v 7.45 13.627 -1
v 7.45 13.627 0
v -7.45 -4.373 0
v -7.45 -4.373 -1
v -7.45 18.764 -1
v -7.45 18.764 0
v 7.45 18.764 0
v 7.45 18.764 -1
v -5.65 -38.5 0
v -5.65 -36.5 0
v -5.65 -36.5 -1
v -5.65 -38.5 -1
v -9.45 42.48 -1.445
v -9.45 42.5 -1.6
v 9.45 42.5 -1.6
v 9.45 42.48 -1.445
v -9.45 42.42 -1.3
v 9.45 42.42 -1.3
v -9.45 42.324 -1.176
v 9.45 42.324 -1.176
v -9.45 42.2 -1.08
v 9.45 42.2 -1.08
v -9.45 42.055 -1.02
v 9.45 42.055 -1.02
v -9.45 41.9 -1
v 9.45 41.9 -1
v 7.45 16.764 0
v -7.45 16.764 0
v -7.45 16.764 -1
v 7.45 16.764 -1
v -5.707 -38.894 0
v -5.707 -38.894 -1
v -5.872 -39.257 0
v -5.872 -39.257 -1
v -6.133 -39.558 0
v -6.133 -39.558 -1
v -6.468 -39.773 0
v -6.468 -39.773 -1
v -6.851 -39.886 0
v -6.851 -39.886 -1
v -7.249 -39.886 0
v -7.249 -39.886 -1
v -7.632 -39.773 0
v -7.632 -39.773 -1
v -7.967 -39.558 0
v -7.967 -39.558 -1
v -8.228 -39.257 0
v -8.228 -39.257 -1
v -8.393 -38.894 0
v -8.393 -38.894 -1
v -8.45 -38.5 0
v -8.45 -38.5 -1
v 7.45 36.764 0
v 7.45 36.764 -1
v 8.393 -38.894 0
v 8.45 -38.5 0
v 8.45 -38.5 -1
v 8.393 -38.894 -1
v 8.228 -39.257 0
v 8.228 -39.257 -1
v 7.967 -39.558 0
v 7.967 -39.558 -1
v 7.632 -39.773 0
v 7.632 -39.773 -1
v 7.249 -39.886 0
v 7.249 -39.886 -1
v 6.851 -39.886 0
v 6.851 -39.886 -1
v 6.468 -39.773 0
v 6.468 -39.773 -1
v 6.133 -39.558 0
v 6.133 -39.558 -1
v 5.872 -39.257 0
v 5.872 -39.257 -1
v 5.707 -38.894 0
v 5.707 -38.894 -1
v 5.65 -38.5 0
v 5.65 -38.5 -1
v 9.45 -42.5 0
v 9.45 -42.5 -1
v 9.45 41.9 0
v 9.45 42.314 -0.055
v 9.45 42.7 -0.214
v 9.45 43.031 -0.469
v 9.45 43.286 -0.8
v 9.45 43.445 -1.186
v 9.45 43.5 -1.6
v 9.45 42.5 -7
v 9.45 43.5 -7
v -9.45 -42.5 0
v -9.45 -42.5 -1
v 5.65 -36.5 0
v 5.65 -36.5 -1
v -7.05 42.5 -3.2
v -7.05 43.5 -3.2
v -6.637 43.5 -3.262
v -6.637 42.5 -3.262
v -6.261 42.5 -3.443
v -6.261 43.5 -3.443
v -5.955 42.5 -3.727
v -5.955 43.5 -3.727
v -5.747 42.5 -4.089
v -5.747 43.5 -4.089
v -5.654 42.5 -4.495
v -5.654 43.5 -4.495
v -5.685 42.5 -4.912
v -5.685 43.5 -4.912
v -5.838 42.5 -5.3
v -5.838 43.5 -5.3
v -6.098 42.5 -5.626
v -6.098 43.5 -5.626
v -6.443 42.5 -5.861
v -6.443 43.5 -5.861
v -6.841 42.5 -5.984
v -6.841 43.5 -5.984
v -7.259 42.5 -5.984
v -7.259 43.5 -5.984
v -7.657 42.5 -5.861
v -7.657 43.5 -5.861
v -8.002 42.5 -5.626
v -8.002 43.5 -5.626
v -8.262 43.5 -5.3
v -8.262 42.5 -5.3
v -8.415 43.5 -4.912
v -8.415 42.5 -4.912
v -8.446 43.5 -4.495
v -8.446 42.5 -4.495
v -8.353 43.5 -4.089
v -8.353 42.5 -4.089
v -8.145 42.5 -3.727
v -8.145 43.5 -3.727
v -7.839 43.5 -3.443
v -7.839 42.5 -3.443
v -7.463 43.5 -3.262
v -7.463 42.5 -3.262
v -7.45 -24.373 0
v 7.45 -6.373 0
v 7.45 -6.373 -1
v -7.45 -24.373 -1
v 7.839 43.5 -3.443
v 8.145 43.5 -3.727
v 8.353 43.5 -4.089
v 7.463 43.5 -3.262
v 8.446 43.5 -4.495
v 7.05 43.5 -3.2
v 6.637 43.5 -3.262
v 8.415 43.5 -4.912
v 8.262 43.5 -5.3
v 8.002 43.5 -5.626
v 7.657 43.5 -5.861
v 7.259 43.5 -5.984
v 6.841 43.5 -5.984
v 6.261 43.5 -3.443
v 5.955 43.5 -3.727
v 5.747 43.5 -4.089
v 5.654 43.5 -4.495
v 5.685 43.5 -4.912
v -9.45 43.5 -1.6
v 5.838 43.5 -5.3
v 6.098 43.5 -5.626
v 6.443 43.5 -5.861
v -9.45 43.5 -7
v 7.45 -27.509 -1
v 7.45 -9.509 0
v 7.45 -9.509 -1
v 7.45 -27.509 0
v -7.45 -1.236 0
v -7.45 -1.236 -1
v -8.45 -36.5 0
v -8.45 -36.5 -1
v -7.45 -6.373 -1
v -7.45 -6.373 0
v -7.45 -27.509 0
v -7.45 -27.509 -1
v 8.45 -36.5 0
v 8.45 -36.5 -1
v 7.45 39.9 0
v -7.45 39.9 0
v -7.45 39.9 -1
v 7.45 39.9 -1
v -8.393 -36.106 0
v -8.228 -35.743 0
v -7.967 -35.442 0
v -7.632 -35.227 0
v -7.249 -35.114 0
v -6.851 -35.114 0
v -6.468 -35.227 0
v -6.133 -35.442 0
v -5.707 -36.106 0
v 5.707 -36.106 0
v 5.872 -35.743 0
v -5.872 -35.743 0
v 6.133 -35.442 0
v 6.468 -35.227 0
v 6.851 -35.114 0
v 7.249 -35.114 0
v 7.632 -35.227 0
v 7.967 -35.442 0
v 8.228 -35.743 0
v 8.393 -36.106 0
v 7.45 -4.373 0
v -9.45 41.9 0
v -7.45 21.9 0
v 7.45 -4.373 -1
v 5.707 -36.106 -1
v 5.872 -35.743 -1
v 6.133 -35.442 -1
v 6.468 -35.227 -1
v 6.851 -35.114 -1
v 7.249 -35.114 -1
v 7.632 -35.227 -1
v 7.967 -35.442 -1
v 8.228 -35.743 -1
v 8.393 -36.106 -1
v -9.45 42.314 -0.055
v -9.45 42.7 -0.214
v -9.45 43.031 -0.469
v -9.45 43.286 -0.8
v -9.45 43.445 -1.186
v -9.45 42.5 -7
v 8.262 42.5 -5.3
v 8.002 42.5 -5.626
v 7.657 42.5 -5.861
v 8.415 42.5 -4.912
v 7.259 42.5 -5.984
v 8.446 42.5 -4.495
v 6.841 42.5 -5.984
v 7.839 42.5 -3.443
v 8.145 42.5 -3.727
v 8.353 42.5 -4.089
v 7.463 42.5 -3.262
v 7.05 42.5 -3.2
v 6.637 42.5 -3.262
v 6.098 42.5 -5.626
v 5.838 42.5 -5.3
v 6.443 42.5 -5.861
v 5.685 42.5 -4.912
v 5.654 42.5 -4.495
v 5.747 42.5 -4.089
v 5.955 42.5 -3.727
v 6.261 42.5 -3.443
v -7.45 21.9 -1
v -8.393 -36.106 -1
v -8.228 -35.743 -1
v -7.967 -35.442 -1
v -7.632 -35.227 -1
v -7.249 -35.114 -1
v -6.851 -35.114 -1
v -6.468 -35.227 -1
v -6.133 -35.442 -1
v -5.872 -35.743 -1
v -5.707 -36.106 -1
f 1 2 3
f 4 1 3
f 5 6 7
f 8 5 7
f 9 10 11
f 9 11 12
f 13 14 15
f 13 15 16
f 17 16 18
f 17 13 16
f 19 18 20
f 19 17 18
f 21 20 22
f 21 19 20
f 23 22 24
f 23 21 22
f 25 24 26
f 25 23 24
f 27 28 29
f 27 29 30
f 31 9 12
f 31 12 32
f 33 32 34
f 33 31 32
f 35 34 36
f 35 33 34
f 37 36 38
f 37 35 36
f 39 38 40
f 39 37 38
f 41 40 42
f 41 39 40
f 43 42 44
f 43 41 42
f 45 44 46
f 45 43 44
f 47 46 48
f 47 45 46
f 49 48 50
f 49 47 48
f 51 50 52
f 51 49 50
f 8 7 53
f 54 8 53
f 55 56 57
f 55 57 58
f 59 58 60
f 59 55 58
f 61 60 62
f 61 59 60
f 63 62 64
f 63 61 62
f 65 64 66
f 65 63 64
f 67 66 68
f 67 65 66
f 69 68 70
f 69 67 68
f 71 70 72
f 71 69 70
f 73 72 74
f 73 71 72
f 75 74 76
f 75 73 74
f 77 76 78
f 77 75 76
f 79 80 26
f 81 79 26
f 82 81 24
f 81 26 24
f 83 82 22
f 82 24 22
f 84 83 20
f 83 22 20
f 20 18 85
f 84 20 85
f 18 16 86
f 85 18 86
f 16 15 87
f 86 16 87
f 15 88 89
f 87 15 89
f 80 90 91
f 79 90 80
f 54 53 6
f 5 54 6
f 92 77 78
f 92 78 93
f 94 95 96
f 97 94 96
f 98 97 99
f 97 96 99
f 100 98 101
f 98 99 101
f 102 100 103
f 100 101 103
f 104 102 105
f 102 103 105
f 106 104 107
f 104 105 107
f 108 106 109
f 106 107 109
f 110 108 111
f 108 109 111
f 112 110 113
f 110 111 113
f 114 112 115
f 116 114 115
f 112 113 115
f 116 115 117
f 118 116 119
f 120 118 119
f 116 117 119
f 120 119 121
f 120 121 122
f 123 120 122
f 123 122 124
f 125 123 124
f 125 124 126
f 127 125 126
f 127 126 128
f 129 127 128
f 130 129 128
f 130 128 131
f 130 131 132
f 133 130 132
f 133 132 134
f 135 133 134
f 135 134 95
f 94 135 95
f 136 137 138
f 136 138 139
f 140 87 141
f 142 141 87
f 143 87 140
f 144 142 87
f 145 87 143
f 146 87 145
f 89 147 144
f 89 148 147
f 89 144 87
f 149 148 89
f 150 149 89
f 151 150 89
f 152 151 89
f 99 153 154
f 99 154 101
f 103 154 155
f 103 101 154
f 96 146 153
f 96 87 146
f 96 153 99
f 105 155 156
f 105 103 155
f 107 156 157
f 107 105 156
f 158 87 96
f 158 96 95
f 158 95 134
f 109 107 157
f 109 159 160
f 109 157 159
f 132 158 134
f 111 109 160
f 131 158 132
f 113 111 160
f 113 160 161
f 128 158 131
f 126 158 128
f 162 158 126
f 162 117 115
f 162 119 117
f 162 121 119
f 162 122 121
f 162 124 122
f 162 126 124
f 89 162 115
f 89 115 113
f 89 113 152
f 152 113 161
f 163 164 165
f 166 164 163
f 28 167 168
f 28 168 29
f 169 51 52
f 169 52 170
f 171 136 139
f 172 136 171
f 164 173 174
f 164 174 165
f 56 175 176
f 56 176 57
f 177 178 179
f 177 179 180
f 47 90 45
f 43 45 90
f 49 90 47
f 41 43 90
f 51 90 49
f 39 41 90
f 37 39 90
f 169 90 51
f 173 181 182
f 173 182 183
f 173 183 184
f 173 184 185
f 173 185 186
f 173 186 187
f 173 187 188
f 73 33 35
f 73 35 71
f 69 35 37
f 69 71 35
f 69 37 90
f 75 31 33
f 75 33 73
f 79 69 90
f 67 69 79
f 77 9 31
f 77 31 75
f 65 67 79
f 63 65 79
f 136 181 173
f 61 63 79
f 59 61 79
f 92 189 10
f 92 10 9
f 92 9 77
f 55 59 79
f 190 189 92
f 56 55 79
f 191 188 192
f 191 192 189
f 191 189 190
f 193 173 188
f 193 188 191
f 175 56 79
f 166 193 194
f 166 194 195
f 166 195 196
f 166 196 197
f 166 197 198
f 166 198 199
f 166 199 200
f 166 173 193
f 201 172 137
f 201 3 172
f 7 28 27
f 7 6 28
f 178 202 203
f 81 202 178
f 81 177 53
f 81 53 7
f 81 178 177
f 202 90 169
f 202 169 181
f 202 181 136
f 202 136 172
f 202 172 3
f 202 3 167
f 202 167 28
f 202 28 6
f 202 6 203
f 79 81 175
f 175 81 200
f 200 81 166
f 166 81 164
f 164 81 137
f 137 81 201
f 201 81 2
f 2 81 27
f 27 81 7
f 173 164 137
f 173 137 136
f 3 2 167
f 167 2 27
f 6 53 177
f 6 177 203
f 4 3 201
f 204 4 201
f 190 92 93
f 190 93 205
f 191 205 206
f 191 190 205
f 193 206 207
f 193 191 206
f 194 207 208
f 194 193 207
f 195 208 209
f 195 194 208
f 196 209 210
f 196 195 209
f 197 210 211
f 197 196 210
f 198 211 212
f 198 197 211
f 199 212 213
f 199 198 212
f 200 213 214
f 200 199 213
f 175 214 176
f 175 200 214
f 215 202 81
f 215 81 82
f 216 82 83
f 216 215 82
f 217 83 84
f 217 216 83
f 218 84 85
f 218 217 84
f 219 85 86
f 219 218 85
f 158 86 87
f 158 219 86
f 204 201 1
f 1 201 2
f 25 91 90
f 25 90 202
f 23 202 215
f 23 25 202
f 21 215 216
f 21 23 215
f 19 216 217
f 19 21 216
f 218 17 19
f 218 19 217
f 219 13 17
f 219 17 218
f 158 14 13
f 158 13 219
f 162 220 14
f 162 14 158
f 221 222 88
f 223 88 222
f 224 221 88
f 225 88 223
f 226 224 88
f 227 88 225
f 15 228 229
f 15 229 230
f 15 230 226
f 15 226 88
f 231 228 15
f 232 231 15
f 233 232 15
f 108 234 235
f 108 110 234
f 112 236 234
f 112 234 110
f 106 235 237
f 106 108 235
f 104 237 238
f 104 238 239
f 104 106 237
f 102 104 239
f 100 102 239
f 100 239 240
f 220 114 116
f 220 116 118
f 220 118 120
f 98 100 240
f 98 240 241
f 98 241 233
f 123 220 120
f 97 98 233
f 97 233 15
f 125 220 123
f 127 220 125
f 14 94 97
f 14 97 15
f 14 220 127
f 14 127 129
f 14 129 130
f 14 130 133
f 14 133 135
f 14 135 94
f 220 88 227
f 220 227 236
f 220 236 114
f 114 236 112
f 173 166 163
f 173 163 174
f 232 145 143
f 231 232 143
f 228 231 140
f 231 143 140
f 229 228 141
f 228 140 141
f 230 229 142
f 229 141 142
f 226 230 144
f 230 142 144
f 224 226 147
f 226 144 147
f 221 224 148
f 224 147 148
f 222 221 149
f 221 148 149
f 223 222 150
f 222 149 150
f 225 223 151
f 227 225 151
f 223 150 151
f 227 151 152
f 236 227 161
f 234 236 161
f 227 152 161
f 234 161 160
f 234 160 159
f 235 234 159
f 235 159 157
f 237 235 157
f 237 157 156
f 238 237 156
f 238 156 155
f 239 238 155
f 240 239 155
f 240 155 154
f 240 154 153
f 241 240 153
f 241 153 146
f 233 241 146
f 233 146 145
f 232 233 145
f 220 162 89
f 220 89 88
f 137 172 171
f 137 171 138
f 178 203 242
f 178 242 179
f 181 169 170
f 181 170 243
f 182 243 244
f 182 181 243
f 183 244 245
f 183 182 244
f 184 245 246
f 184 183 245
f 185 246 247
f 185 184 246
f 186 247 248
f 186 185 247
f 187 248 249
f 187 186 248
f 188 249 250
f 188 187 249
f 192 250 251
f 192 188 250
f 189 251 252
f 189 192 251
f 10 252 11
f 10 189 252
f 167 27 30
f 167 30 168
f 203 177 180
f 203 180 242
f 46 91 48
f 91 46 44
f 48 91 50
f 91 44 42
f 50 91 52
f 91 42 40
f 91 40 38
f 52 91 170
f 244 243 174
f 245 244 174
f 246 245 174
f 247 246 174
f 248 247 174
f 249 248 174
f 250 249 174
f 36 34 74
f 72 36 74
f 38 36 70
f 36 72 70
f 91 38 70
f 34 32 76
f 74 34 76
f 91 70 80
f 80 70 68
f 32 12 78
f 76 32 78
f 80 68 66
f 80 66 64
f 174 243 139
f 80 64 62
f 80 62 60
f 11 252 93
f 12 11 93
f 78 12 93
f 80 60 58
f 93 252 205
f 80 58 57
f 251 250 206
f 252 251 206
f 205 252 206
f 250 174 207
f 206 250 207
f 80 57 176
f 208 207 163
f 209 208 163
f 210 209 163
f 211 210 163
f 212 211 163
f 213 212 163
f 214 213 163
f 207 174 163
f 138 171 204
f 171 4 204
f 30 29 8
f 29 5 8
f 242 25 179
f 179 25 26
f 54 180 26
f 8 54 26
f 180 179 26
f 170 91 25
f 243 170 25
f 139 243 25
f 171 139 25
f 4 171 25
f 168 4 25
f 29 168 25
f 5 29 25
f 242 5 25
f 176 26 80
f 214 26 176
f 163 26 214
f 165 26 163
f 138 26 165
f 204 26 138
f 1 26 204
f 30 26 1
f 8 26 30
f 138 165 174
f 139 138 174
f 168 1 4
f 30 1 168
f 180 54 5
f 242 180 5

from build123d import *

# Parameters (mm, degrees)
SKETCH1_W                    = 18.9
SKETCH1_H                    = 85
BASE_FLANGE1_DEPTH           = 1
EDGE_FLANGE1_STRIP_W         = 5.2
EDGE_FLANGE1_STRIP_H         = 1
EDGE_FLANGE1_STRIP_CUT_DEPTH = 18.9
EDGE_FLANGE1_DEPTH           = 18.9
SKETCH9_R                    = 1.4
CUT_EXTRUDE1_DEPTH           = 10
CUT_EXTRUDE4_DEPTH           = 10


# Sheet-metal steps are written as plain solids
with BuildPart() as part:
    # Sketch1 → Base-Flange1 (new body)
    with BuildSketch(Plane.XY):
        Rectangle(SKETCH1_W, SKETCH1_H)
        with BuildLine():
            Line((-5.65, -36.5), (-5.65, -38.5))
            ThreePointArc((-5.65, -38.5), (-7.05, -39.9), (-8.45, -38.5))
            Line((-8.45, -38.5), (-8.45, -36.5))
            ThreePointArc((-8.45, -36.5), (-7.05, -35.1), (-5.65, -36.5))
        make_face(mode=Mode.SUBTRACT)
        with BuildLine():
            Line((8.45, -36.5), (8.45, -38.5))
            ThreePointArc((8.45, -38.5), (7.05, -39.9), (5.65, -38.5))
            Line((5.65, -38.5), (5.65, -36.5))
            ThreePointArc((5.65, -36.5), (7.05, -35.1), (8.45, -36.5))
        make_face(mode=Mode.SUBTRACT)
    extrude(amount=-BASE_FLANGE1_DEPTH)

    # Edge-Flange1 strip (across the edge) → Edge-Flange1 strip cut (cut)
    with BuildSketch(Plane(origin=(-9.45, 42.5, -1), x_dir=(0, -1, 0), z_dir=(1, 0, 0))):
        with Locations((-2, -0.5)):
            Rectangle(EDGE_FLANGE1_STRIP_W, EDGE_FLANGE1_STRIP_H)
    extrude(amount=EDGE_FLANGE1_STRIP_CUT_DEPTH, mode=Mode.SUBTRACT)

    # Edge-Flange1 section (across the edge) → Edge-Flange1 (add)
    with BuildSketch(Plane(origin=(-9.45, 42.5, -1), x_dir=(0, -1, 0), z_dir=(1, 0, 0))):
        with BuildLine():
            Line((-1, 0.6), (-1, 6))
            Line((-1, 6), (0, 6))
            Line((0, 6), (0, 0.6))
            ThreePointArc((0, 0.6), (0.175735931, 0.175735931), (0.6, 0))
            Line((0.6, 0), (0.6, -1))
            ThreePointArc((0.6, -1), (-0.53137085, -0.53137085), (-1, 0.6))
        make_face()
    extrude(amount=EDGE_FLANGE1_DEPTH)

    # Sketch9 → Cut-Extrude1 (cut)
    with BuildSketch(Plane(origin=(0, 43.5, 0), x_dir=(1, 0, 0), z_dir=(0, 1, 0))):
        with Locations(Location((-7.05, 4.6, 0), (0, 0, 270))):
            Circle(SKETCH9_R)
        with Locations(Location((7.05, 4.6, 0), (0, 0, 270))):
            Circle(SKETCH9_R)
    extrude(amount=-CUT_EXTRUDE1_DEPTH, mode=Mode.SUBTRACT)

    # Sketch12 → Cut-Extrude4 (cut)
    with BuildSketch(Plane.XY):
        Polygon((7.45, 39.9), (-7.45, 21.9), (-7.45, 39.9), align=None)
        Polygon((7.45, 36.763509145), (-7.45, 18.763509145), (7.45, 18.763509145), align=None)
        Polygon((-7.45, 16.763509145), (7.45, 16.763509145), (-7.45, -1.236490855), align=None)
        Polygon((7.45, 13.62701829), (-7.45, -4.37298171), (7.45, -4.37298171), align=None)
        Polygon((-7.45, -6.37298171), (7.45, -6.37298171), (-7.45, -24.37298171), align=None)
        Polygon((-7.45, -27.509472565), (7.45, -9.509472565), (7.45, -27.509472565), align=None)
    extrude(amount=-CUT_EXTRUDE4_DEPTH, mode=Mode.SUBTRACT)


solid = part.part
